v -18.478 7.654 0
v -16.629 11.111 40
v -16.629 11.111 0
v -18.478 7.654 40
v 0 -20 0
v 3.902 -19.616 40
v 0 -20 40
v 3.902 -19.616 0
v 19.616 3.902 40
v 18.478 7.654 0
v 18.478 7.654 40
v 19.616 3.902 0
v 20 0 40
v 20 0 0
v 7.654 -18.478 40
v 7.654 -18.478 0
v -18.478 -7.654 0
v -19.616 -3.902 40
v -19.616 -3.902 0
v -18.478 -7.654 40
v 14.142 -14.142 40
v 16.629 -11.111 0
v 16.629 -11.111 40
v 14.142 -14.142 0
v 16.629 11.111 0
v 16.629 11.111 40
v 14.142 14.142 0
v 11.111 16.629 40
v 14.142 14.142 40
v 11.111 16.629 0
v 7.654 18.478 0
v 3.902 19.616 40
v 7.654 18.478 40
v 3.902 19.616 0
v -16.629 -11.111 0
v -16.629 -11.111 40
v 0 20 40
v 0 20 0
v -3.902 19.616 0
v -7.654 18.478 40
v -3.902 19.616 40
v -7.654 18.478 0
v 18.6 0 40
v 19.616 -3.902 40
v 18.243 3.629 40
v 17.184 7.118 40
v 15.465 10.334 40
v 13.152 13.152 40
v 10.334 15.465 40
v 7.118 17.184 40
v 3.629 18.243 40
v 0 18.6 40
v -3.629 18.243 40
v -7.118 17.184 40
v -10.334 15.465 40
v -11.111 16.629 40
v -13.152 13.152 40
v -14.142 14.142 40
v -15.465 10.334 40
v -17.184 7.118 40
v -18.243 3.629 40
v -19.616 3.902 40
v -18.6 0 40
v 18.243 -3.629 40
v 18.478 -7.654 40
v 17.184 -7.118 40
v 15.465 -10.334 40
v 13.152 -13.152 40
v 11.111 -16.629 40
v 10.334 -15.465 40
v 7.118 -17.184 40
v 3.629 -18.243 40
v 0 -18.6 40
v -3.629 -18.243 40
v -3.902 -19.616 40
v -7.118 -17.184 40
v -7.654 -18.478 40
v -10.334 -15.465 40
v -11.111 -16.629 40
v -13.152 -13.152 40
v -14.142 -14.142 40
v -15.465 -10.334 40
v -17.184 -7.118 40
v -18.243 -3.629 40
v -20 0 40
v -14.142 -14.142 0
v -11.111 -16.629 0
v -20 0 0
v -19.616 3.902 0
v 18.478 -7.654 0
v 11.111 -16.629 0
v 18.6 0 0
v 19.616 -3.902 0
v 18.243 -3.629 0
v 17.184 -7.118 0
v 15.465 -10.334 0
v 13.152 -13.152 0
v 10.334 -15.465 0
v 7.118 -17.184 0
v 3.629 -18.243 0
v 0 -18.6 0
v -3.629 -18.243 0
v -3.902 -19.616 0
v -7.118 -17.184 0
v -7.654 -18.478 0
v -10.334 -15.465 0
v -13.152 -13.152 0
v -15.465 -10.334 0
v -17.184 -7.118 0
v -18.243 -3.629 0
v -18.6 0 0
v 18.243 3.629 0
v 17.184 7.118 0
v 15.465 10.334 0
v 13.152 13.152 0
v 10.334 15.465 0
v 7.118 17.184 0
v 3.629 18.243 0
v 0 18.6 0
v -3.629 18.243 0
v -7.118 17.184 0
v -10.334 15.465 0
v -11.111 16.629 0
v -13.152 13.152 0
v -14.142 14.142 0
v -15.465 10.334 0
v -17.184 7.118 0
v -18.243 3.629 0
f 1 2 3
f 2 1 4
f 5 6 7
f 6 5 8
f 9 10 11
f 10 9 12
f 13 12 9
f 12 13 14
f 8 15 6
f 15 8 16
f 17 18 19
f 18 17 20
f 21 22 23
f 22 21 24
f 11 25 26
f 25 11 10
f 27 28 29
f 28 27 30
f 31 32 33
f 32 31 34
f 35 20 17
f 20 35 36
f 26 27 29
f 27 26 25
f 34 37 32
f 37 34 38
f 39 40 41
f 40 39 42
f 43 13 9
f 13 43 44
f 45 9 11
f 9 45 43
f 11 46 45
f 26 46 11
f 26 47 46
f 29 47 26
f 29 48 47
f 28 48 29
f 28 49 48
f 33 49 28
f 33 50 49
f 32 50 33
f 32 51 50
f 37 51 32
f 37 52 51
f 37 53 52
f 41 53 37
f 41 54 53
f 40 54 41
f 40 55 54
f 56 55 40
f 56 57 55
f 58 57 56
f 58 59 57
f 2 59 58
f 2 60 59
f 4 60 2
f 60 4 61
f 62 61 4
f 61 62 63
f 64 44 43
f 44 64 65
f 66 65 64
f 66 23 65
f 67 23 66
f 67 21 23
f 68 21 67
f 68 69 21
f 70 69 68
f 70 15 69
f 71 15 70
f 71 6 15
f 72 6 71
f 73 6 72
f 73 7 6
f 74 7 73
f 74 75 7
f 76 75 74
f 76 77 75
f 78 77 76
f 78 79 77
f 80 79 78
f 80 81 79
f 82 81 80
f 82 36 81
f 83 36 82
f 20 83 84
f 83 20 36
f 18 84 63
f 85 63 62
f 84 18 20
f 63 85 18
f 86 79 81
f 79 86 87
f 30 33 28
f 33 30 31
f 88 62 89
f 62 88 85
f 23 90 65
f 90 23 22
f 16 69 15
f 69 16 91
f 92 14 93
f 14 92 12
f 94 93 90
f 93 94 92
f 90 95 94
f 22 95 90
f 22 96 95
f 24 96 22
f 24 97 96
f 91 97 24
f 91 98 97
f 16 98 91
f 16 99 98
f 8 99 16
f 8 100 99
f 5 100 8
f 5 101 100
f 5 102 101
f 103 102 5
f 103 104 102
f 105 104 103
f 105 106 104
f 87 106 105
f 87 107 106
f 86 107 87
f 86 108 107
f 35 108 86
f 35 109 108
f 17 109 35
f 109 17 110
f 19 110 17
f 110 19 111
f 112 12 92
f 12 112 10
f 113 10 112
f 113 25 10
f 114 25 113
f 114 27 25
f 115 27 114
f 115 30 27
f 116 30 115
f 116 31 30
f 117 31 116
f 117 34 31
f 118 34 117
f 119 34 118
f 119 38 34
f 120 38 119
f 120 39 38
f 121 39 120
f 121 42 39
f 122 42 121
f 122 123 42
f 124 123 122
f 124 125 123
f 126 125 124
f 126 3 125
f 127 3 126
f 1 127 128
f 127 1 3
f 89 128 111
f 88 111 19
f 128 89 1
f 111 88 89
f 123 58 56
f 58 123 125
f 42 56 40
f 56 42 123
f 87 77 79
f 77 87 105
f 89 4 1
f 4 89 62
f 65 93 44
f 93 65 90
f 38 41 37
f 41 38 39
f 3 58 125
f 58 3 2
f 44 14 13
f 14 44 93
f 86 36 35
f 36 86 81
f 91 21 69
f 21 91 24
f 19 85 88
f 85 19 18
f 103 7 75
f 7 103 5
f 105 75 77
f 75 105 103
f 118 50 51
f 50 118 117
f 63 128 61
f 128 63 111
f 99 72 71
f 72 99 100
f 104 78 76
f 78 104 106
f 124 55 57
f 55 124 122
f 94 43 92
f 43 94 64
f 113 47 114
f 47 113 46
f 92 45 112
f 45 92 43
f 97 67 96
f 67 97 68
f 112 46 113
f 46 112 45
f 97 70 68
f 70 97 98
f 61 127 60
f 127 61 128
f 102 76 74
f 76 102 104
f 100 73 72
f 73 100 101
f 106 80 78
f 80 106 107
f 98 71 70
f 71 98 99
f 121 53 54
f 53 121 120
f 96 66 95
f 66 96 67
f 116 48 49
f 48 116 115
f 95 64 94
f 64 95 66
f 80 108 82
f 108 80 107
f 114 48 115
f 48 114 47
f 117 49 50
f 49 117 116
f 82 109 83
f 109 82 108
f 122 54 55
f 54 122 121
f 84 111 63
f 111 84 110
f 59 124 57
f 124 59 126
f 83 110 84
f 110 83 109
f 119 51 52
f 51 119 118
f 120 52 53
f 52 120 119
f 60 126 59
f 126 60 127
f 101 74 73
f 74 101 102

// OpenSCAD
$fn = 32;

// ----------------------------------------------------------------------
// Thin tube: 1.4 mm wall
// ----------------------------------------------------------------------

// --- parameters (mm) ---
tube_od = 40;             // outer diameter
tube_h = 40;              // height, Z
wall = 1.4;               // wall thickness
fit_tol = 0.1;            // tolerance for press fits, mm
free_tol = 0.3;           // tolerance for clearance fits, mm

difference() {
  cylinder(h = tube_h, d = tube_od);
  translate([0, 0, -1]) cylinder(h = tube_h + 2, d = tube_od - 2 * wall);
}
